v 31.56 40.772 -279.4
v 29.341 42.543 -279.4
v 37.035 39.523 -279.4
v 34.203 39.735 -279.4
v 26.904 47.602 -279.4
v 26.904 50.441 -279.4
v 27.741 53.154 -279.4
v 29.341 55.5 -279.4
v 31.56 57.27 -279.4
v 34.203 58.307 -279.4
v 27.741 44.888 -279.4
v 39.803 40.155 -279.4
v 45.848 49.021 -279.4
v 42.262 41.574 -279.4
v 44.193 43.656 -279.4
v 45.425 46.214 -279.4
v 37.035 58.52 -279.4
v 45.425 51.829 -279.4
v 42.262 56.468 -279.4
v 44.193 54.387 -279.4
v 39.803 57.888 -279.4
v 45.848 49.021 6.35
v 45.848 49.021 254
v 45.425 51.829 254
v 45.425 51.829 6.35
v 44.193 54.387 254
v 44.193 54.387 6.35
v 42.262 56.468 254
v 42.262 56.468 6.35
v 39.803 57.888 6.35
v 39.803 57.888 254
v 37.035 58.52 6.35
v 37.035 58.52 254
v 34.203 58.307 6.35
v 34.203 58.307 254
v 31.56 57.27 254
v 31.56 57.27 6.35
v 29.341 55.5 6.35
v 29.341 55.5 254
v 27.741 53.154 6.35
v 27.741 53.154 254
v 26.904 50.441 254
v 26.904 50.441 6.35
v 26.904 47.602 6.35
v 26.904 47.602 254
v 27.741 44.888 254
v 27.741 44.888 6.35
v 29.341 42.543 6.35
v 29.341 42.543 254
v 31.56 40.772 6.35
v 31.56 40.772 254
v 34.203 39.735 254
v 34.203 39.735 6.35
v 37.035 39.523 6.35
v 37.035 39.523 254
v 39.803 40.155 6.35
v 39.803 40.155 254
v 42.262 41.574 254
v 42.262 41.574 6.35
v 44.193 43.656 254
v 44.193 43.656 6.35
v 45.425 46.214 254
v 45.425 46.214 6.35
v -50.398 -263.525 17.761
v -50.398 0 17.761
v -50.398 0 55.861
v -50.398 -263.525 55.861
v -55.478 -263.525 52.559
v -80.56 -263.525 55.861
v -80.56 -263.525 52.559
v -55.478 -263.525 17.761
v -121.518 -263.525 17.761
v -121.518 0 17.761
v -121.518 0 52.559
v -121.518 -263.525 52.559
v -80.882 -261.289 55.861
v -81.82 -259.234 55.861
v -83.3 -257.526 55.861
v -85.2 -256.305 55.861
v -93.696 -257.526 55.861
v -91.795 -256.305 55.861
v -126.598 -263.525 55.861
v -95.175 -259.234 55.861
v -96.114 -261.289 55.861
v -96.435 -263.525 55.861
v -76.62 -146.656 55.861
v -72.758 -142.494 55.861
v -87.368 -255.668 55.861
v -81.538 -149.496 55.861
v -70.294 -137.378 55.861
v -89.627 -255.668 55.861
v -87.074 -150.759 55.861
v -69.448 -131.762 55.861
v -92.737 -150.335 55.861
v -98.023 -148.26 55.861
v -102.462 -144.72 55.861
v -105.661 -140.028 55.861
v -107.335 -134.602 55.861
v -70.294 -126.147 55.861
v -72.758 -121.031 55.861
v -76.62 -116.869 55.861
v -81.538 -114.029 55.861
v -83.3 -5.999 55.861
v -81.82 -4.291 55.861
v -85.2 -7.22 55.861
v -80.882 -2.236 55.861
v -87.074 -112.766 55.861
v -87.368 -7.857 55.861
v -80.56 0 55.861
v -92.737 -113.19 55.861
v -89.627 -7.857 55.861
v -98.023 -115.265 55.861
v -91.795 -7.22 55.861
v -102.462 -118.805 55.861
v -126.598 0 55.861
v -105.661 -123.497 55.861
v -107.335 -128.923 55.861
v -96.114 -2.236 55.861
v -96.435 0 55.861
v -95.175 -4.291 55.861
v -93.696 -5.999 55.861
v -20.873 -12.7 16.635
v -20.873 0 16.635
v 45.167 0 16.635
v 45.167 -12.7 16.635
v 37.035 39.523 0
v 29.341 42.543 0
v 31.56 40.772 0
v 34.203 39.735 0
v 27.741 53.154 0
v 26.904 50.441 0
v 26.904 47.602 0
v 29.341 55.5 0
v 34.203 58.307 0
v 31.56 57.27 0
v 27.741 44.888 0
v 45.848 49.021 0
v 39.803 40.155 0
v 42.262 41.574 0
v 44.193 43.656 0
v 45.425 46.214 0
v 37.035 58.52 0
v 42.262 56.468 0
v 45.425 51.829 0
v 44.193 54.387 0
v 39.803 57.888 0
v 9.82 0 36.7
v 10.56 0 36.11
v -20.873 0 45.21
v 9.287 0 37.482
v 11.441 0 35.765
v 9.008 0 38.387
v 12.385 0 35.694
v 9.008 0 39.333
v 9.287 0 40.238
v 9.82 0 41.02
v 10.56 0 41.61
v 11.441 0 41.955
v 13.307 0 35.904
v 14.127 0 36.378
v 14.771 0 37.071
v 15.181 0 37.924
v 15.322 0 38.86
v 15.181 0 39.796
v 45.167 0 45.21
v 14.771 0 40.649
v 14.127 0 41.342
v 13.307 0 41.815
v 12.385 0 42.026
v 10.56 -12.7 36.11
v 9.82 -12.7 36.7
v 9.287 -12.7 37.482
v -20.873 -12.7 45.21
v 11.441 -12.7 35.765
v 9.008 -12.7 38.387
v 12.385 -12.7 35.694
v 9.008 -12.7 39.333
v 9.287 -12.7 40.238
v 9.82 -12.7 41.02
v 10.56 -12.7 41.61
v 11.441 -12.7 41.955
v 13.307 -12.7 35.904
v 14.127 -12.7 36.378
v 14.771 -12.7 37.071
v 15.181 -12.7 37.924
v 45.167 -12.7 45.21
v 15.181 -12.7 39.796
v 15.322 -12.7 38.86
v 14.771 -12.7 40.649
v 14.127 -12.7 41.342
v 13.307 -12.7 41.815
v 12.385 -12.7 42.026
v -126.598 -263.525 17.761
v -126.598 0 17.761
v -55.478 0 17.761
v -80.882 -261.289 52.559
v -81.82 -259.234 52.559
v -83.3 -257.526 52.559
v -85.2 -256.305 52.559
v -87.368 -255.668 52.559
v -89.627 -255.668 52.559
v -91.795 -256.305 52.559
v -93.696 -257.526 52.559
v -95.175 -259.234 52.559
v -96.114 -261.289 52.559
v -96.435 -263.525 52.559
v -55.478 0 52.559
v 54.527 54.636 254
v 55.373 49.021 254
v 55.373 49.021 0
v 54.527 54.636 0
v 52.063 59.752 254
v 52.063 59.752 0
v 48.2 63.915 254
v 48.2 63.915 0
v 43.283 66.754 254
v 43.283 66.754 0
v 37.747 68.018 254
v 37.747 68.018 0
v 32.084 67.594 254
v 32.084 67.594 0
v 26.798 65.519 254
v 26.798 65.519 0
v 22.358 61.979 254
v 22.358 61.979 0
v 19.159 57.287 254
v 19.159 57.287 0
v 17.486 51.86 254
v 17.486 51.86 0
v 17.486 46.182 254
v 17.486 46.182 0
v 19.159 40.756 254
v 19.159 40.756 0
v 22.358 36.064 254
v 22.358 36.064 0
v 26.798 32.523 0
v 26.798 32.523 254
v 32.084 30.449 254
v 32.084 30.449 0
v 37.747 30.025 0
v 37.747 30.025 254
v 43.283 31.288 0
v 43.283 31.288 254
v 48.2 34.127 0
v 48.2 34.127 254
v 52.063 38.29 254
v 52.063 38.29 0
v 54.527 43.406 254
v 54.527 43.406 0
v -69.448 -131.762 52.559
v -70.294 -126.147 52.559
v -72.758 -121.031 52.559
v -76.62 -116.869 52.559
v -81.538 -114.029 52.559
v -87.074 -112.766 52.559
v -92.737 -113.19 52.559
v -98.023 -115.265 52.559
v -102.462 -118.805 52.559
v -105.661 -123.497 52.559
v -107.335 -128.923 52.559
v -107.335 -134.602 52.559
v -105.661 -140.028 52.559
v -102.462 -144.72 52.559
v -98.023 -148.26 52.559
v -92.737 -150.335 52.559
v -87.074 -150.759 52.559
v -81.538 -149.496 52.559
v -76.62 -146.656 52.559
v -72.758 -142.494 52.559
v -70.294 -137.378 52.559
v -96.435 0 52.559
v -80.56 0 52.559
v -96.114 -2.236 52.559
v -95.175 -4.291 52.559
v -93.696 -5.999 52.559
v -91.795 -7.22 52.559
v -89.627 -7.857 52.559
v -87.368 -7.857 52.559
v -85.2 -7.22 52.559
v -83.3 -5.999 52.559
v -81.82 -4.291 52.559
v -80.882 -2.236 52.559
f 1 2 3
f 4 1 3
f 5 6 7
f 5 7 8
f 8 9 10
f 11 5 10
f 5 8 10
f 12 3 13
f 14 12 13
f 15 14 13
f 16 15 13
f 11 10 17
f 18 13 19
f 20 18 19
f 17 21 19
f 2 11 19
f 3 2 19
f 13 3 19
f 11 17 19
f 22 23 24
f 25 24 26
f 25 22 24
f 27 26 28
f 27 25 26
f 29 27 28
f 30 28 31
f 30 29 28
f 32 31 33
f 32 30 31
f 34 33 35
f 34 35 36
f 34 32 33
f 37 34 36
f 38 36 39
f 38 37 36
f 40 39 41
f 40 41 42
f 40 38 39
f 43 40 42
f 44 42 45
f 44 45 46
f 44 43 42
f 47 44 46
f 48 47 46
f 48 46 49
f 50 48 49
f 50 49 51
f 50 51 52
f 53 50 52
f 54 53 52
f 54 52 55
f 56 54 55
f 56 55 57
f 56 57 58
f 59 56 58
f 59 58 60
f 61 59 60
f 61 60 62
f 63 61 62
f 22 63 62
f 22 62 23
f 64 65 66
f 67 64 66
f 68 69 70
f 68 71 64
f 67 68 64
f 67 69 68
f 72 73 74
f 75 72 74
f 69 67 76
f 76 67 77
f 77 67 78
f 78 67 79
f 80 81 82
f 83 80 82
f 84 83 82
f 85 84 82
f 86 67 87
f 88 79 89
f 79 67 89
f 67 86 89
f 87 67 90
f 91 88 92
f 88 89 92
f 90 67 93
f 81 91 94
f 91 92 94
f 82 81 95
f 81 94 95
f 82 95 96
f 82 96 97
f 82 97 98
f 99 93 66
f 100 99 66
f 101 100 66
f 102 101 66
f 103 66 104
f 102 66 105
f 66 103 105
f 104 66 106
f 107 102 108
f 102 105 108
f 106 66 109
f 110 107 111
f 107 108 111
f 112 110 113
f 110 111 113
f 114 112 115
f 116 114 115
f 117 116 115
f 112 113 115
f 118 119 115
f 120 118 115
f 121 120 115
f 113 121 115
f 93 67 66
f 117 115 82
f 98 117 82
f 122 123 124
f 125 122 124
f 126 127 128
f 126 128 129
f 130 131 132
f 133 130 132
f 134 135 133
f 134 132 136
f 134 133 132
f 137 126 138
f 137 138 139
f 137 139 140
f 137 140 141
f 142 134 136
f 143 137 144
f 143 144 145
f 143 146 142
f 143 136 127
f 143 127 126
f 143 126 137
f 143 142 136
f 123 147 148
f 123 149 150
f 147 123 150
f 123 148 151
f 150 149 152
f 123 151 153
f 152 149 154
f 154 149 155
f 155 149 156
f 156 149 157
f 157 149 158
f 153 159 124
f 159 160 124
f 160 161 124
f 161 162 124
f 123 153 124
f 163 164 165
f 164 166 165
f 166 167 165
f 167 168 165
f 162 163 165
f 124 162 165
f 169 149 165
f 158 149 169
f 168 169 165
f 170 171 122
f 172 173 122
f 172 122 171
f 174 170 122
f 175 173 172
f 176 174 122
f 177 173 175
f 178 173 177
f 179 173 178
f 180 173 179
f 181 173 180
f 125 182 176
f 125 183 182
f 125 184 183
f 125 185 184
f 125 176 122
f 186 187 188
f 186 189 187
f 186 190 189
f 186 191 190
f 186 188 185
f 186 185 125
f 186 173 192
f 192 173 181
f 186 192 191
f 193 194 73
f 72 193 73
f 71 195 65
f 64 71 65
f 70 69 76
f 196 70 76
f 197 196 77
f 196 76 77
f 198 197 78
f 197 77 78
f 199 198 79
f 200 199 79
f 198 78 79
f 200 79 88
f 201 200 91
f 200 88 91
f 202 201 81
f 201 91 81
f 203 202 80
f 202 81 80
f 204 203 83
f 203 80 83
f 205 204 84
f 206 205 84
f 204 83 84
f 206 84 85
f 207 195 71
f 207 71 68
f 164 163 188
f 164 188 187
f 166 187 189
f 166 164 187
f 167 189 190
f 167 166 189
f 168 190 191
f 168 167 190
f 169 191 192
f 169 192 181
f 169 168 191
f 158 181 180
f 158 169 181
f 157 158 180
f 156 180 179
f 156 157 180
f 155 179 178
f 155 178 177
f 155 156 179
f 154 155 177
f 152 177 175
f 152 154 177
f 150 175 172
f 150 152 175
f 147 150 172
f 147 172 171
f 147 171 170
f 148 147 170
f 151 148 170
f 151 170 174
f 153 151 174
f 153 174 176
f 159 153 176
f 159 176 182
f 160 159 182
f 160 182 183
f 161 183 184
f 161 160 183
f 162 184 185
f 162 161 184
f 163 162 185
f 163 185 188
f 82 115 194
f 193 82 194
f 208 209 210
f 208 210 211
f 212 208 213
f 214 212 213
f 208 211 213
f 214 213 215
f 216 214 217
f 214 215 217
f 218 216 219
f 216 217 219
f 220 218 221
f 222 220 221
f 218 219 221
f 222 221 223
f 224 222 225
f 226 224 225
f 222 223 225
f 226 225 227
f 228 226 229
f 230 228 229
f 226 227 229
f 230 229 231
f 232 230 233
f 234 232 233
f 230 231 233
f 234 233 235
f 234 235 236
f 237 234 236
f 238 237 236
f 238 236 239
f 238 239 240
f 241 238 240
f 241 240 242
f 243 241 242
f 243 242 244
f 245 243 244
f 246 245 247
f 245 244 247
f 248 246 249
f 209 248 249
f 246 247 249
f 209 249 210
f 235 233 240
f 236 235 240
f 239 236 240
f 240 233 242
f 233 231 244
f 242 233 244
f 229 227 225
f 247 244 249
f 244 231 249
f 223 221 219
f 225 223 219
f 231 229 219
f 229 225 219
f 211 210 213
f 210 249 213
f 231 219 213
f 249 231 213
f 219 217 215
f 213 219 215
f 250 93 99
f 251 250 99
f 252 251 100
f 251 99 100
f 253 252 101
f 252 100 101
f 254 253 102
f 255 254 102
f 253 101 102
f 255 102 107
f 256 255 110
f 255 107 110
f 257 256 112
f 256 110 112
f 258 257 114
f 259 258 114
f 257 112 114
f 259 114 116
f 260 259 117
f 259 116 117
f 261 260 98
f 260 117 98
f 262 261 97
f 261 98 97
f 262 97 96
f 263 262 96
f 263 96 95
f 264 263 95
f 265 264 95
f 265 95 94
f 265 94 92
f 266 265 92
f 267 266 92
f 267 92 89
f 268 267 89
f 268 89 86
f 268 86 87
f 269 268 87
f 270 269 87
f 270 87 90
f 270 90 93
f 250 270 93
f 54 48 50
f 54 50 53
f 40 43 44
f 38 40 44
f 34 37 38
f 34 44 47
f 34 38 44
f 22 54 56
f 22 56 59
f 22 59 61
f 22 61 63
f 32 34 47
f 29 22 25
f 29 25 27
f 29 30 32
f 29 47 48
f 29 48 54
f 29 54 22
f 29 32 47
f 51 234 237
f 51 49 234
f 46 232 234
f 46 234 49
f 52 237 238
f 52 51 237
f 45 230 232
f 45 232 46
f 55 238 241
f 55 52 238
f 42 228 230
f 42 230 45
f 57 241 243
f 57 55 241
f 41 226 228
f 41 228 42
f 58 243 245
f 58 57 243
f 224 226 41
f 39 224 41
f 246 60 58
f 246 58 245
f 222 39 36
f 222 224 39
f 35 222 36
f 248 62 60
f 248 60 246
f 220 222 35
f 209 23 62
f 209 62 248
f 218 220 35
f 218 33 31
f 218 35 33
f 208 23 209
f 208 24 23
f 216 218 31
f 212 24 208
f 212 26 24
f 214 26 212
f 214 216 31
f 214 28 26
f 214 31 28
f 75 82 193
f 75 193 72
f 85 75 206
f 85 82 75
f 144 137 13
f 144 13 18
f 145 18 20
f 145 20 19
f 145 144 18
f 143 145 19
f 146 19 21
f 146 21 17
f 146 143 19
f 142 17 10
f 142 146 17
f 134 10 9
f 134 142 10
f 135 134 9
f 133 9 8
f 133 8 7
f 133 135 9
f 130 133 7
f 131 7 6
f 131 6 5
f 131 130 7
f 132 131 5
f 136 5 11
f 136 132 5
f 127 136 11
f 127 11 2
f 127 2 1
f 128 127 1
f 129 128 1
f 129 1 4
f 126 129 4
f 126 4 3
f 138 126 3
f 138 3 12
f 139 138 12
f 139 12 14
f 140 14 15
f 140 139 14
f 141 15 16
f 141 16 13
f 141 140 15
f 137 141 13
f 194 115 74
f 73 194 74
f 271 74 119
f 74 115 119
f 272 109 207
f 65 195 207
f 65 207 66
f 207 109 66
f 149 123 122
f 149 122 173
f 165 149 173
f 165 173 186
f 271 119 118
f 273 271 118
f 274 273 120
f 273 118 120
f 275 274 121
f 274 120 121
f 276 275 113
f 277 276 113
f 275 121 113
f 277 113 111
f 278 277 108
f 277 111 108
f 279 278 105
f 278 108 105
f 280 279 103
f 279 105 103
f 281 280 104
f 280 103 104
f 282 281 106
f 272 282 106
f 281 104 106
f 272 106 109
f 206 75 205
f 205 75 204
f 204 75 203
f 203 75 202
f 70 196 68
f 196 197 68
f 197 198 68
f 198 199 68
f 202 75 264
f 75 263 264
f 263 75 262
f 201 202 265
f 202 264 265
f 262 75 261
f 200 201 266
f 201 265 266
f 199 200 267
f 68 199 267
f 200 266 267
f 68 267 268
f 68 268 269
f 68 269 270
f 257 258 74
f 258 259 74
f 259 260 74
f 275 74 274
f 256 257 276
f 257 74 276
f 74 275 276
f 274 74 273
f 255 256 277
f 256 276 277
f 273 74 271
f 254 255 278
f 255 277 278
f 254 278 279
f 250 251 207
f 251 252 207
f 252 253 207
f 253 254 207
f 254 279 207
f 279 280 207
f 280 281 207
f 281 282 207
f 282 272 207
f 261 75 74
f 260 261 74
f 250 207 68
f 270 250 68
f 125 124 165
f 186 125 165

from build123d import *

# Parameters (mm, degrees)
F0_W     = 5.08
F0_H     = 3.302
F0_W_2   = 66.04
F0_H_2   = 34.798
F1_DEPTH = 263.525
F2_R     = 19.05
F3_DEPTH = 38.101
F4_W     = 66.04
F4_H     = 28.575
F4_R     = 3.175
F5_DEPTH = 12.7
F6_R     = 19.05
F6_R_2   = 9.525
F7_DEPTH = 254
F8_DEPTH = 6.35
F9_DEPTH = 279.4


with BuildPart() as f1:
    # F0 (on Front) → F1 (new body)
    with BuildSketch(Plane.XZ):
        with Locations((-124.0577634996, 54.2100830038)):
            Rectangle(F0_W, F0_H)
        with Locations((-88.4977634996, 54.2100830038)):
            Rectangle(F0_W_2, F0_H)
        with Locations((-124.0577634996, 35.1600830038)):
            Rectangle(F0_W, F0_H_2)
        with Locations((-52.9377634996, 35.1600830038)):
            Rectangle(F0_W, F0_H_2)
        with Locations((-52.9377634996, 54.2100830038)):
            Rectangle(F0_W, F0_H)
    extrude(amount=F1_DEPTH)

    # F2 (on face) → F3 (cut, through all)
    with BuildSketch(Plane.XY.offset(55.8610830038)):
        with Locations((-88.4977634996, -131.7625)):
            Circle(F2_R)
        with BuildLine():
            ThreePointArc((-96.4352634996, 0), (-88.4977634996, -7.9375), (-80.5602634996, 0))
            Line((-80.5602634996, 0), (-96.4352634996, 0))
        make_face()
        with BuildLine():
            Line((-96.4352634996, -263.525), (-80.5602634996, -263.525))
            ThreePointArc((-80.5602634996, -263.525), (-88.4977634996, -255.5875), (-96.4352634996, -263.525))
        make_face()
    extrude(amount=-F3_DEPTH, mode=Mode.SUBTRACT)


with BuildPart() as f5:
    # F4 (on Front) → F5 (new body)
    with BuildSketch(Plane.XZ):
        with Locations((12.147304602, 30.9224660316)):
            Rectangle(F4_W, F4_H)
        with Locations((12.147304602, 38.8599660316)):
            Circle(F4_R, mode=Mode.SUBTRACT)
    extrude(amount=F5_DEPTH)


with BuildPart() as f7:
    # F6 (on Top) → F7 (new body)
    with BuildSketch(Plane.XY):
        with Locations((36.3229177892, 49.0212365985)):
            Circle(F6_R)
        with Locations((36.3229177892, 49.0212365985)):
            Circle(F6_R_2, mode=Mode.SUBTRACT)
    extrude(amount=F7_DEPTH)

    # F6 (on Top) → F8 (join)
    with BuildSketch(Plane.XY):
        with Locations((36.3229177892, 49.0212365985)):
            Circle(F6_R_2)
    extrude(amount=F8_DEPTH)


with BuildPart() as f9:
    # F6 (on Top) → F9 (new body)
    with BuildSketch(Plane.XY):
        with Locations((36.3229177892, 49.0212365985)):
            Circle(F6_R_2)
    extrude(amount=-F9_DEPTH)


solid = Compound([f1.part, f5.part, f7.part, f9.part])
